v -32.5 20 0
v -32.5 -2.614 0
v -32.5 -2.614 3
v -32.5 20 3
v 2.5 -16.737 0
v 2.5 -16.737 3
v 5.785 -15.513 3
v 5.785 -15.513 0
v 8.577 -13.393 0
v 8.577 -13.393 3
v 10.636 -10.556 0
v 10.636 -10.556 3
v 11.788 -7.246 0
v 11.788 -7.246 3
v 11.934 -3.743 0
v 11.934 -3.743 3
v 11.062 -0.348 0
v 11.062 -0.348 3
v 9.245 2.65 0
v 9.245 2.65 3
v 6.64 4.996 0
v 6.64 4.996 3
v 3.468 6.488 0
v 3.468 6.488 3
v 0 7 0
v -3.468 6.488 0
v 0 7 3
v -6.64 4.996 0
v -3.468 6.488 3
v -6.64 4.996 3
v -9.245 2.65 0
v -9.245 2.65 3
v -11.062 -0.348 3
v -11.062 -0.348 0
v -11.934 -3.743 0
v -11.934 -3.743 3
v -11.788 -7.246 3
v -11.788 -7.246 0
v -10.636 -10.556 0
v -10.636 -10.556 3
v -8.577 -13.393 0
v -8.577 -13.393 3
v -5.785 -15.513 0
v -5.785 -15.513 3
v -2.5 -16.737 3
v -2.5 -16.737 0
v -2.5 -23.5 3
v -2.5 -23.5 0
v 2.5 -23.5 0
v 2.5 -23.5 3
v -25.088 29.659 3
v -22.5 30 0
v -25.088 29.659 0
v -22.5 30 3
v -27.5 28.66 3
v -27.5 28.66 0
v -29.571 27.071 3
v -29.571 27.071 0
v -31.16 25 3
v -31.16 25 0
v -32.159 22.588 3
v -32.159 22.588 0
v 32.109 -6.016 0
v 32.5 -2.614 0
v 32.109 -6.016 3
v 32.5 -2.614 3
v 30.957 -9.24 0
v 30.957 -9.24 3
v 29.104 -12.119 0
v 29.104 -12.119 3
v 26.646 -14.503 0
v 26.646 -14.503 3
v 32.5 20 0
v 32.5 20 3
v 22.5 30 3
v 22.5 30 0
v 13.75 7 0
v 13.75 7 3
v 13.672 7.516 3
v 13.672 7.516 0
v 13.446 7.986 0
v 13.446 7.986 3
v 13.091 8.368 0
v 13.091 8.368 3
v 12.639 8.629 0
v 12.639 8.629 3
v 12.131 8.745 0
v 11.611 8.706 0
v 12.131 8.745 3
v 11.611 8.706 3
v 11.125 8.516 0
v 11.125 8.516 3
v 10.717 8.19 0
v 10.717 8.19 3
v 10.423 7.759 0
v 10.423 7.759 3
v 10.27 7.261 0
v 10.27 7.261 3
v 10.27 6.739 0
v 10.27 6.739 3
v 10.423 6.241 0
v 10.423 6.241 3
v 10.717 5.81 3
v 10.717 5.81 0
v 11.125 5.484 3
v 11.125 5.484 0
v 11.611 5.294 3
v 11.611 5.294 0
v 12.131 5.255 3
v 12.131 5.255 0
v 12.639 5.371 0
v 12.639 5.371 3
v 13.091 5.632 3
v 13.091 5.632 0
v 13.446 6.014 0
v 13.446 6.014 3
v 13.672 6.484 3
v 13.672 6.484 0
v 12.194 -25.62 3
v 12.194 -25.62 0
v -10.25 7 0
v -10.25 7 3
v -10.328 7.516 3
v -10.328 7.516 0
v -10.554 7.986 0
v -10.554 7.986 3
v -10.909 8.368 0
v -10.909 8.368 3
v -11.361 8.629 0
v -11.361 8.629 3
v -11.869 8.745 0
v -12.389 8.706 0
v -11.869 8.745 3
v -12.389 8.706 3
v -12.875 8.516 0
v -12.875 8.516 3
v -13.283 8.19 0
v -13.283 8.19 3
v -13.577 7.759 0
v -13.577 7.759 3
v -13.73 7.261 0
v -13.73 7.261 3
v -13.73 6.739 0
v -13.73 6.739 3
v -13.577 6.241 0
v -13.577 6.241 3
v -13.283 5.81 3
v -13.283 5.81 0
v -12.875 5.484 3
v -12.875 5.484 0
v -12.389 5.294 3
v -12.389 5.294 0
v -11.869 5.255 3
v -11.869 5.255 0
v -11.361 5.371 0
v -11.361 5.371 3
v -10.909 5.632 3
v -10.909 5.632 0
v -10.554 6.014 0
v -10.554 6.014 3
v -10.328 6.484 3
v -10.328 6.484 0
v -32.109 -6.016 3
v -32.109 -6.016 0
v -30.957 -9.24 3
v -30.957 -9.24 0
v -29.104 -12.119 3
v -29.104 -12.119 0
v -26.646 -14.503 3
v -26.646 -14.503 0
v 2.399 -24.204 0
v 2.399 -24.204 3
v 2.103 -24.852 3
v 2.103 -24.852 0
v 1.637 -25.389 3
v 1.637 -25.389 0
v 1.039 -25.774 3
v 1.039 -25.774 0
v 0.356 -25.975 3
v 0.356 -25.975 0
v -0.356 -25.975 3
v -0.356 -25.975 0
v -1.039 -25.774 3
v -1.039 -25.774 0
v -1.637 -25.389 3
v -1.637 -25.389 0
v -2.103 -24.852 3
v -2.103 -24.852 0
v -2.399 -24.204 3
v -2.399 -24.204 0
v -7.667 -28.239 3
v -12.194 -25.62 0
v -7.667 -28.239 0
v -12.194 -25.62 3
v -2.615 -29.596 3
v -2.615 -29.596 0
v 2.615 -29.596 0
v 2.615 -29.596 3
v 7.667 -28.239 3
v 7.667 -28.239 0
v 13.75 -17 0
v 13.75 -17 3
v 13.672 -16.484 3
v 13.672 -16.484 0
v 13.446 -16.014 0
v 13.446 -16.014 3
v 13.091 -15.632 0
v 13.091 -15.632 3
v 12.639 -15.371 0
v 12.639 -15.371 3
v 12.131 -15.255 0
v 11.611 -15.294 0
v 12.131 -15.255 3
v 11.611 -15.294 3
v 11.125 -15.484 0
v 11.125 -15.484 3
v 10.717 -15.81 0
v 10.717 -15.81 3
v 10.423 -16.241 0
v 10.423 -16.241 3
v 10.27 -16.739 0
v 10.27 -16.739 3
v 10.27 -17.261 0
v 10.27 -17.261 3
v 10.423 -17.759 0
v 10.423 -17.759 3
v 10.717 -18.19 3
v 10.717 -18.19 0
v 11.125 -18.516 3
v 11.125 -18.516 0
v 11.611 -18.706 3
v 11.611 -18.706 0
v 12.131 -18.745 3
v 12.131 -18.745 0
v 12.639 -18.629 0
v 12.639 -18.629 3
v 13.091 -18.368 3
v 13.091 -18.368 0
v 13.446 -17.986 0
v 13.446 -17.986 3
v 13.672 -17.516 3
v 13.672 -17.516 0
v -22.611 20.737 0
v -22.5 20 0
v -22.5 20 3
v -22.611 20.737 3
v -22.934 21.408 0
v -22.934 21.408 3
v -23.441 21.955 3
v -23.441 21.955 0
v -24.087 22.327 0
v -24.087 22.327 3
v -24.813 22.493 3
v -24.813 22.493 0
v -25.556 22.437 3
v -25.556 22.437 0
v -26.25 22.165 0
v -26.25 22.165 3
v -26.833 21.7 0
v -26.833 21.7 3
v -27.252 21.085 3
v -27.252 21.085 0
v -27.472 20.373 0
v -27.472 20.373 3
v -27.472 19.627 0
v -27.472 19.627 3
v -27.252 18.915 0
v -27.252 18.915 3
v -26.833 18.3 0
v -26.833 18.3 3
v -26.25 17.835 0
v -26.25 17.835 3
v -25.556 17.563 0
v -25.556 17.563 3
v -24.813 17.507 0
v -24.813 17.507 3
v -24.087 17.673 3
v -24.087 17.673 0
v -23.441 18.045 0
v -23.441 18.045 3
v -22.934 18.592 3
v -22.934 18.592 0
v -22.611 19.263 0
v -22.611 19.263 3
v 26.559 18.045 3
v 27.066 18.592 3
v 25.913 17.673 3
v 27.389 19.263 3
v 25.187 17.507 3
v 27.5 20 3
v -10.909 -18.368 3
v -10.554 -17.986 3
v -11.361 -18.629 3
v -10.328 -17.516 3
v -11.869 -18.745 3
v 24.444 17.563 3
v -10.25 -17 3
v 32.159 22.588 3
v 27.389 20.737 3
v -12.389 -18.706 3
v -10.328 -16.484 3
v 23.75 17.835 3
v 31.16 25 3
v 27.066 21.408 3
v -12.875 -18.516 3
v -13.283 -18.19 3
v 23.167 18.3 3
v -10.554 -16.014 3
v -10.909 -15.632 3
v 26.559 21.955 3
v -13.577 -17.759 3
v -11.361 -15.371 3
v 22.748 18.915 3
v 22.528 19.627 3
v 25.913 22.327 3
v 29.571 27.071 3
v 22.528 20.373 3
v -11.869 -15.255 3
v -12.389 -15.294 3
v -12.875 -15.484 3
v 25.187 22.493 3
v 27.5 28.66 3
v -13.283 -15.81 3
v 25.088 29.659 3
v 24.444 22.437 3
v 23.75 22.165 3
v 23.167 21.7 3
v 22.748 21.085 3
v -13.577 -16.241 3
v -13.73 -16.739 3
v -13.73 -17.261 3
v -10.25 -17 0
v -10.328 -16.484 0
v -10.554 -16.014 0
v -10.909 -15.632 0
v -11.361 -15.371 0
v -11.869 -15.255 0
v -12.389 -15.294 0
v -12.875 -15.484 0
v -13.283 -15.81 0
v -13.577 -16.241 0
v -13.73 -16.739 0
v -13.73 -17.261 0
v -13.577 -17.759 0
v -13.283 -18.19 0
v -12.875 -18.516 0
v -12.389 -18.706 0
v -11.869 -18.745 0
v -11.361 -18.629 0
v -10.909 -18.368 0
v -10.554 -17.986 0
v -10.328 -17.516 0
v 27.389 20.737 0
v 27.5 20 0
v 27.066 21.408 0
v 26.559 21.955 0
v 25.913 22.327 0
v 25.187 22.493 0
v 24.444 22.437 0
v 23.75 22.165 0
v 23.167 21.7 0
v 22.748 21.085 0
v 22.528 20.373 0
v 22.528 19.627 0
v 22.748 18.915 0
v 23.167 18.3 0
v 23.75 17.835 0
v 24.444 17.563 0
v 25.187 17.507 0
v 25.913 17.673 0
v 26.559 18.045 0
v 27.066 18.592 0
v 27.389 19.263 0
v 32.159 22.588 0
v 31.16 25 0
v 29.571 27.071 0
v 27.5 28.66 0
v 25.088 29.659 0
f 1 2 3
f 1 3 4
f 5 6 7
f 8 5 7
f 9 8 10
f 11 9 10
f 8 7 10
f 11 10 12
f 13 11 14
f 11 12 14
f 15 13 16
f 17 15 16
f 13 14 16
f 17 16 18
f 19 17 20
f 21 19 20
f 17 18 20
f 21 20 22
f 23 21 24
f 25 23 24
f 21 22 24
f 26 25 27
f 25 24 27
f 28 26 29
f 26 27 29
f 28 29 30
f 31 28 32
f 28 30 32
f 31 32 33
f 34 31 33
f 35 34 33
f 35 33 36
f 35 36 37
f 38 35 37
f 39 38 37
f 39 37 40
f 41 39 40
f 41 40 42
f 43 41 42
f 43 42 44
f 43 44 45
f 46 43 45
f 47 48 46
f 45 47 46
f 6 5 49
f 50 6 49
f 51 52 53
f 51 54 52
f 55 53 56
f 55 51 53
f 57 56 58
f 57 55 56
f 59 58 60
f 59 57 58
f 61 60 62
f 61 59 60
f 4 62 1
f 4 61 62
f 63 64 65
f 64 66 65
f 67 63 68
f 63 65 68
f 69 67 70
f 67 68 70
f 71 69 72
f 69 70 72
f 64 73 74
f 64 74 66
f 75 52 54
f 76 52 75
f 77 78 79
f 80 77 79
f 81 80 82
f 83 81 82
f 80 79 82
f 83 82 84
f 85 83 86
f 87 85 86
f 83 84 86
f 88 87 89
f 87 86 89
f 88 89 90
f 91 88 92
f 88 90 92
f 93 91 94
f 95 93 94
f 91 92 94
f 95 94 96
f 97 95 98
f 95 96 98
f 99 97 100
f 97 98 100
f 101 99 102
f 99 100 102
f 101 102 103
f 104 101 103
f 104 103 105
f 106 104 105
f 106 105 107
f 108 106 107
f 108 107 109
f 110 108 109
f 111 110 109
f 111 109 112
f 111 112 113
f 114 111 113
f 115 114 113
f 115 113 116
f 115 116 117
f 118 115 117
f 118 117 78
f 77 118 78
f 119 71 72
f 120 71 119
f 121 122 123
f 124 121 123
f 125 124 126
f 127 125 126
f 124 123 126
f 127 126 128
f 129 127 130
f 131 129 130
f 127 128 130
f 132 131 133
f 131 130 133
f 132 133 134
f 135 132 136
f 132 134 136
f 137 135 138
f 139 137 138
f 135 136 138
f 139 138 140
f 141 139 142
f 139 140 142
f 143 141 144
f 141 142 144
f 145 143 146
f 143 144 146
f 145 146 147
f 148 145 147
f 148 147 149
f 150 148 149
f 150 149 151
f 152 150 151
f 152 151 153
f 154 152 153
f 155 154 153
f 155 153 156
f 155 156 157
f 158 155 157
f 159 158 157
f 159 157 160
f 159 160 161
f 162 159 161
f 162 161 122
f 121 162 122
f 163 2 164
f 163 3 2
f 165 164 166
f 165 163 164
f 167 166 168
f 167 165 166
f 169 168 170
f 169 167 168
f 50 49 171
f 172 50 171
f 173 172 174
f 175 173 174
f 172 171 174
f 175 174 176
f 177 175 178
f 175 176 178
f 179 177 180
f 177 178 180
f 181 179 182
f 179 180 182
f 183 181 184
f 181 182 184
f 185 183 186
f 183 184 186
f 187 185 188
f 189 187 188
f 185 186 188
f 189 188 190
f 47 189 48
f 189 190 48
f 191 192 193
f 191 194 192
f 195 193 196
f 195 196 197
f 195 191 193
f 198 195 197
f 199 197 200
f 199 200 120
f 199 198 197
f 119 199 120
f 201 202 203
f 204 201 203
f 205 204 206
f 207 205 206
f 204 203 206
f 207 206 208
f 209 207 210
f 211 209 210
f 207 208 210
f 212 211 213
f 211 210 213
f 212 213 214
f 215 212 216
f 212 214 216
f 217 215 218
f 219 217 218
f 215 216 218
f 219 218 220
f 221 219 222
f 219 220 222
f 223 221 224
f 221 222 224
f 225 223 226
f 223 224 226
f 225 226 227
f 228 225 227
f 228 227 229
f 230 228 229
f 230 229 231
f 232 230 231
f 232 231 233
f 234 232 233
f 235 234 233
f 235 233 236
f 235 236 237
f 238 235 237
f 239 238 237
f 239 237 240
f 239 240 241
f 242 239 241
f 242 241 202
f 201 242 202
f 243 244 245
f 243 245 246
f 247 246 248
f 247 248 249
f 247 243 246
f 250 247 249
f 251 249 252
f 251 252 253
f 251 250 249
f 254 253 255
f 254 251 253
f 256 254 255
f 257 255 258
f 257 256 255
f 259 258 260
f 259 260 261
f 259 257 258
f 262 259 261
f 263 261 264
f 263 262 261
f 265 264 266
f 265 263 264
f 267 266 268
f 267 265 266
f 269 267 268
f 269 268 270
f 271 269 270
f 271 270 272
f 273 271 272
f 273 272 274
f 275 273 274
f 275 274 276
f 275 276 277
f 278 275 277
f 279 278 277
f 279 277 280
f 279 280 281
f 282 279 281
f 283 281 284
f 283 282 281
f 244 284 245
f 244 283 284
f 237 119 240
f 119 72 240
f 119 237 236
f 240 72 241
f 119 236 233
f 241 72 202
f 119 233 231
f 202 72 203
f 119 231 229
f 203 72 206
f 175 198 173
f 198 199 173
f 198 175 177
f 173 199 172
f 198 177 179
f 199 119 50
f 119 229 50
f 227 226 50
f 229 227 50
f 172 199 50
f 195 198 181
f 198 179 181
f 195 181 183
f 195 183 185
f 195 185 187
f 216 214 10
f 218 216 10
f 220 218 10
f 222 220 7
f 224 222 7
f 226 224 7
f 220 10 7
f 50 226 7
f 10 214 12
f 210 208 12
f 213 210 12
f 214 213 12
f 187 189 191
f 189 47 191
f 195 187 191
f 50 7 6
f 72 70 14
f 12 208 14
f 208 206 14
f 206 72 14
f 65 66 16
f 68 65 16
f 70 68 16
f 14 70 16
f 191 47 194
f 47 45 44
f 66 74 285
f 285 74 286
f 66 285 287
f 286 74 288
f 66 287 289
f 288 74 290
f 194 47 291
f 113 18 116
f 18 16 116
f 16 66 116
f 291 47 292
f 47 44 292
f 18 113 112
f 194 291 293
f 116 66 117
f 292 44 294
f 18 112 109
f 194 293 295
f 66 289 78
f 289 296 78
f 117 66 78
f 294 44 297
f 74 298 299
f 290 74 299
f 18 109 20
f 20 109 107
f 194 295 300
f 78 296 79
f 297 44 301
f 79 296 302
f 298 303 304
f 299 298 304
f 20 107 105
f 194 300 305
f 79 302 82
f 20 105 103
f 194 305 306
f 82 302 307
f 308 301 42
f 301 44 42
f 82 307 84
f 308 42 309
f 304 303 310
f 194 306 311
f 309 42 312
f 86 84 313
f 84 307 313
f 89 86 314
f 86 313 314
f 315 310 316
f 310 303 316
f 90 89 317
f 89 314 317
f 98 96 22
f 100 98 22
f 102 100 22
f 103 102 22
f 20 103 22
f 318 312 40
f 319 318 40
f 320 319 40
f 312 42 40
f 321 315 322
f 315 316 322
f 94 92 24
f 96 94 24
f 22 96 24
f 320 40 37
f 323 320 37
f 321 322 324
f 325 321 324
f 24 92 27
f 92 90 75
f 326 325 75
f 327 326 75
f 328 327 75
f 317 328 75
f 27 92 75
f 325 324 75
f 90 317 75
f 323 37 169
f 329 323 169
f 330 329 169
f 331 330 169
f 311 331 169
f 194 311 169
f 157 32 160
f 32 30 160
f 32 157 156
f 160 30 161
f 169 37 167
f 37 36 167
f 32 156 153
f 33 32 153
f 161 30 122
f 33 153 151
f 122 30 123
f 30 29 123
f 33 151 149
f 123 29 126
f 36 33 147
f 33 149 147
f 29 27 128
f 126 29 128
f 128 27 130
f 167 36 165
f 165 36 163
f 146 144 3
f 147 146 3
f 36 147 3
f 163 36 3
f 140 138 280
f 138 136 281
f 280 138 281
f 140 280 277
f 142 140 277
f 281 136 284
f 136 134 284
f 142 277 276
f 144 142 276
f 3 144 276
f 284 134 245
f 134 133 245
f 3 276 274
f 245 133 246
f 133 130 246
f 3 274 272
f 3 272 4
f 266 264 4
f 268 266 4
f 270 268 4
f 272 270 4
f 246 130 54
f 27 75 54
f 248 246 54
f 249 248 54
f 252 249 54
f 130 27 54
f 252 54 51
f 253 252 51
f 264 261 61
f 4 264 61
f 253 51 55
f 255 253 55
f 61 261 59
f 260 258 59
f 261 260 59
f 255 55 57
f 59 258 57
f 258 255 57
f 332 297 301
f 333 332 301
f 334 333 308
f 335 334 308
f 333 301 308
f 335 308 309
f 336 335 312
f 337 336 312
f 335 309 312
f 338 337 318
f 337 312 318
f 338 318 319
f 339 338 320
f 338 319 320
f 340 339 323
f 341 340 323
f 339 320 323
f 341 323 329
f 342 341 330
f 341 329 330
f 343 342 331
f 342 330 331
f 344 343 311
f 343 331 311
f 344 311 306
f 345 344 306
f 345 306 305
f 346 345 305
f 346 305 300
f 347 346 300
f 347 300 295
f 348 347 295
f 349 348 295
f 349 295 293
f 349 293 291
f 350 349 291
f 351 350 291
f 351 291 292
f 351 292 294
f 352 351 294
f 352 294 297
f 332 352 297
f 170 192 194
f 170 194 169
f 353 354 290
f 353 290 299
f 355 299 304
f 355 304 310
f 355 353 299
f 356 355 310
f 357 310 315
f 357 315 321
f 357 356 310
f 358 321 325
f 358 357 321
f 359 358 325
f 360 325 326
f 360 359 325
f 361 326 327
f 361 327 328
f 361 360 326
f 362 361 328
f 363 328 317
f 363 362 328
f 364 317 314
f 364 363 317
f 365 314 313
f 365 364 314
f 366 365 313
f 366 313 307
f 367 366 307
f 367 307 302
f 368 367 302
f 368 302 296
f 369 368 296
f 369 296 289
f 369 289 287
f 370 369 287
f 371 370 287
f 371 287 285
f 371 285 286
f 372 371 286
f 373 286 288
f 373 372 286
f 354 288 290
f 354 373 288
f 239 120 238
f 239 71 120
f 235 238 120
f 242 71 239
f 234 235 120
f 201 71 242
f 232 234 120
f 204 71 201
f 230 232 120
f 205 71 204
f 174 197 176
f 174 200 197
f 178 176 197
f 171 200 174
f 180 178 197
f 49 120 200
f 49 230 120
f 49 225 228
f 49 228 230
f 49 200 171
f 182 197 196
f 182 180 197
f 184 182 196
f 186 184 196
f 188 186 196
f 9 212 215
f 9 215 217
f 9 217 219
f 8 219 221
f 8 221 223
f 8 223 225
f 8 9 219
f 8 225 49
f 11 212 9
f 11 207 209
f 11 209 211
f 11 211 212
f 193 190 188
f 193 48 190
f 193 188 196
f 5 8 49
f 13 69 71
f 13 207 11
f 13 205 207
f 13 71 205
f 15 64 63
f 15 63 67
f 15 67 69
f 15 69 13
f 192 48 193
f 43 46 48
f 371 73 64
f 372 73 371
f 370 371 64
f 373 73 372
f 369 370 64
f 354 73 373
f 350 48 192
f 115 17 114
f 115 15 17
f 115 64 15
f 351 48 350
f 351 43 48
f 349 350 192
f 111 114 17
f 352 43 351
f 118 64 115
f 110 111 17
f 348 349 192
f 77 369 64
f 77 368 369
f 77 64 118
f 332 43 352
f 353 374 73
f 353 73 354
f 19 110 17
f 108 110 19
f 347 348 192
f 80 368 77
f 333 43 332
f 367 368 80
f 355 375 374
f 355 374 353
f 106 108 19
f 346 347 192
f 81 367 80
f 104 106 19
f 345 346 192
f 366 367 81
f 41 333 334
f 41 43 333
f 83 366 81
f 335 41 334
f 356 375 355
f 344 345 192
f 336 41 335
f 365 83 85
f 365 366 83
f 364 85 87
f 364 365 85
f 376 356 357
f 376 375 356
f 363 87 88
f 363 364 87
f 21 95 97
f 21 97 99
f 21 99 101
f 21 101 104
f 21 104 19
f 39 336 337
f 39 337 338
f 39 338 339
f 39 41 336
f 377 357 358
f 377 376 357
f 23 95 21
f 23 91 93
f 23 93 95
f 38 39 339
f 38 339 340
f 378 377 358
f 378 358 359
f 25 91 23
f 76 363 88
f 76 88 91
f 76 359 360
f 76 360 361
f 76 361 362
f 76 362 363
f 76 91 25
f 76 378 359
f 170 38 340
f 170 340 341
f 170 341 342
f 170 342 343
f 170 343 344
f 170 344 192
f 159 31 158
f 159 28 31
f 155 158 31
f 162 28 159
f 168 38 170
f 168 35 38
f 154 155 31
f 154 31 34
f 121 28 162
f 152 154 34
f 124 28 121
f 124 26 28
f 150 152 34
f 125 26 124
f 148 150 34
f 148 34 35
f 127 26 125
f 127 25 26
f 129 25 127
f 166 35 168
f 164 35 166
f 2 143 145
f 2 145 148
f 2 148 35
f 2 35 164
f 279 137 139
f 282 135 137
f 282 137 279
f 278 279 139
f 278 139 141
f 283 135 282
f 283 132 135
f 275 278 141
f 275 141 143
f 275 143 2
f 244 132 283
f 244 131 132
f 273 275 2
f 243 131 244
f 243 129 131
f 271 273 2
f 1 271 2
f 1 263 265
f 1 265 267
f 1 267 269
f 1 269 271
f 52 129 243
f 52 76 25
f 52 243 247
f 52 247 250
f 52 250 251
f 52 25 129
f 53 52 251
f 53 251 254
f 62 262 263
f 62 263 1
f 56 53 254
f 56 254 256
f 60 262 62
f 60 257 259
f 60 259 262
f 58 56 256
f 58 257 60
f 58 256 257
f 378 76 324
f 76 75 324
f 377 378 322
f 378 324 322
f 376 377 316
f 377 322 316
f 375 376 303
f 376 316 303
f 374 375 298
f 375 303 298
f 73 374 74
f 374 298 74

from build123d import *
from OCP.BRepFilletAPI import BRepFilletAPI_MakeFillet

# Parameters (mm, degrees)
SKETCH1_R           = 2.5
BOSS_EXTRUDE1_DEPTH = 3
FILLET1_R1          = 10
FILLET1_R2          = 15
FILLET1_R3          = 20
SKETCH2_R           = 1.75
SKETCH2_R_2         = 12
CUT_EXTRUDE1_DEPTH  = 45.331140297


with BuildPart() as part:
    # Sketch1 → Boss-Extrude1 (new body)
    with BuildSketch(Plane.XY):
        Polygon((-32.5, 30), (32.5, 30), (32.5, -10), (0, -35), (-32.5, -10), align=None)
        with Locations((25, 20)):
            Circle(SKETCH1_R, mode=Mode.SUBTRACT)
        with Locations((-25, 20)):
            Circle(SKETCH1_R, mode=Mode.SUBTRACT)
        with BuildLine():
            Line((2.5, -16.5), (2.5, -23.5))
            ThreePointArc((2.5, -23.5), (0, -26), (-2.5, -23.5))
            Line((-2.5, -23.5), (-2.5, -16.5))
            ThreePointArc((-2.5, -16.5), (0, -14), (2.5, -16.5))
        make_face(mode=Mode.SUBTRACT)
    extrude(amount=BOSS_EXTRUDE1_DEPTH)

    # Fillet1: one fillet with a radius per group of edges: ONE call of the kernel's fillet builder (fillet() takes one radius for all edges)
    fillet1_edges_1 = [part.edges().sort_by_distance(p)[0] for p in [
        (32.5, 30, 1.5),
        (-32.5, 30, 1.5),
    ]]
    fillet1_edges_2 = [part.edges().sort_by_distance(p)[0] for p in [
        (-32.5, -10, 1.5),
        (32.5, -10, 1.5),
    ]]
    fillet1_edges_3 = [part.edges().sort_by_distance(p)[0] for p in [
        (0, -35, 1.5),
    ]]
    fillet1 = BRepFilletAPI_MakeFillet(part.part.solid().wrapped)
    for e in fillet1_edges_1:
        fillet1.Add(FILLET1_R1, e.wrapped)
    for e in fillet1_edges_2:
        fillet1.Add(FILLET1_R2, e.wrapped)
    for e in fillet1_edges_3:
        fillet1.Add(FILLET1_R3, e.wrapped)
    add(Compound.cast(fillet1.Shape()), mode=Mode.REPLACE)

    # Sketch2 → Cut-Extrude1 (cut, through all)
    with BuildSketch(Plane.XY.offset(3)):
        with Locations((12, 7)):
            Circle(SKETCH2_R)
        with Locations((12, -17)):
            Circle(SKETCH2_R)
        with Locations((-12, -17)):
            Circle(SKETCH2_R)
        with Locations((-12, 7)):
            Circle(SKETCH2_R)
        with Locations((0, -5)):
            Circle(SKETCH2_R_2)
    extrude(amount=-CUT_EXTRUDE1_DEPTH, mode=Mode.SUBTRACT)


solid = part.part
